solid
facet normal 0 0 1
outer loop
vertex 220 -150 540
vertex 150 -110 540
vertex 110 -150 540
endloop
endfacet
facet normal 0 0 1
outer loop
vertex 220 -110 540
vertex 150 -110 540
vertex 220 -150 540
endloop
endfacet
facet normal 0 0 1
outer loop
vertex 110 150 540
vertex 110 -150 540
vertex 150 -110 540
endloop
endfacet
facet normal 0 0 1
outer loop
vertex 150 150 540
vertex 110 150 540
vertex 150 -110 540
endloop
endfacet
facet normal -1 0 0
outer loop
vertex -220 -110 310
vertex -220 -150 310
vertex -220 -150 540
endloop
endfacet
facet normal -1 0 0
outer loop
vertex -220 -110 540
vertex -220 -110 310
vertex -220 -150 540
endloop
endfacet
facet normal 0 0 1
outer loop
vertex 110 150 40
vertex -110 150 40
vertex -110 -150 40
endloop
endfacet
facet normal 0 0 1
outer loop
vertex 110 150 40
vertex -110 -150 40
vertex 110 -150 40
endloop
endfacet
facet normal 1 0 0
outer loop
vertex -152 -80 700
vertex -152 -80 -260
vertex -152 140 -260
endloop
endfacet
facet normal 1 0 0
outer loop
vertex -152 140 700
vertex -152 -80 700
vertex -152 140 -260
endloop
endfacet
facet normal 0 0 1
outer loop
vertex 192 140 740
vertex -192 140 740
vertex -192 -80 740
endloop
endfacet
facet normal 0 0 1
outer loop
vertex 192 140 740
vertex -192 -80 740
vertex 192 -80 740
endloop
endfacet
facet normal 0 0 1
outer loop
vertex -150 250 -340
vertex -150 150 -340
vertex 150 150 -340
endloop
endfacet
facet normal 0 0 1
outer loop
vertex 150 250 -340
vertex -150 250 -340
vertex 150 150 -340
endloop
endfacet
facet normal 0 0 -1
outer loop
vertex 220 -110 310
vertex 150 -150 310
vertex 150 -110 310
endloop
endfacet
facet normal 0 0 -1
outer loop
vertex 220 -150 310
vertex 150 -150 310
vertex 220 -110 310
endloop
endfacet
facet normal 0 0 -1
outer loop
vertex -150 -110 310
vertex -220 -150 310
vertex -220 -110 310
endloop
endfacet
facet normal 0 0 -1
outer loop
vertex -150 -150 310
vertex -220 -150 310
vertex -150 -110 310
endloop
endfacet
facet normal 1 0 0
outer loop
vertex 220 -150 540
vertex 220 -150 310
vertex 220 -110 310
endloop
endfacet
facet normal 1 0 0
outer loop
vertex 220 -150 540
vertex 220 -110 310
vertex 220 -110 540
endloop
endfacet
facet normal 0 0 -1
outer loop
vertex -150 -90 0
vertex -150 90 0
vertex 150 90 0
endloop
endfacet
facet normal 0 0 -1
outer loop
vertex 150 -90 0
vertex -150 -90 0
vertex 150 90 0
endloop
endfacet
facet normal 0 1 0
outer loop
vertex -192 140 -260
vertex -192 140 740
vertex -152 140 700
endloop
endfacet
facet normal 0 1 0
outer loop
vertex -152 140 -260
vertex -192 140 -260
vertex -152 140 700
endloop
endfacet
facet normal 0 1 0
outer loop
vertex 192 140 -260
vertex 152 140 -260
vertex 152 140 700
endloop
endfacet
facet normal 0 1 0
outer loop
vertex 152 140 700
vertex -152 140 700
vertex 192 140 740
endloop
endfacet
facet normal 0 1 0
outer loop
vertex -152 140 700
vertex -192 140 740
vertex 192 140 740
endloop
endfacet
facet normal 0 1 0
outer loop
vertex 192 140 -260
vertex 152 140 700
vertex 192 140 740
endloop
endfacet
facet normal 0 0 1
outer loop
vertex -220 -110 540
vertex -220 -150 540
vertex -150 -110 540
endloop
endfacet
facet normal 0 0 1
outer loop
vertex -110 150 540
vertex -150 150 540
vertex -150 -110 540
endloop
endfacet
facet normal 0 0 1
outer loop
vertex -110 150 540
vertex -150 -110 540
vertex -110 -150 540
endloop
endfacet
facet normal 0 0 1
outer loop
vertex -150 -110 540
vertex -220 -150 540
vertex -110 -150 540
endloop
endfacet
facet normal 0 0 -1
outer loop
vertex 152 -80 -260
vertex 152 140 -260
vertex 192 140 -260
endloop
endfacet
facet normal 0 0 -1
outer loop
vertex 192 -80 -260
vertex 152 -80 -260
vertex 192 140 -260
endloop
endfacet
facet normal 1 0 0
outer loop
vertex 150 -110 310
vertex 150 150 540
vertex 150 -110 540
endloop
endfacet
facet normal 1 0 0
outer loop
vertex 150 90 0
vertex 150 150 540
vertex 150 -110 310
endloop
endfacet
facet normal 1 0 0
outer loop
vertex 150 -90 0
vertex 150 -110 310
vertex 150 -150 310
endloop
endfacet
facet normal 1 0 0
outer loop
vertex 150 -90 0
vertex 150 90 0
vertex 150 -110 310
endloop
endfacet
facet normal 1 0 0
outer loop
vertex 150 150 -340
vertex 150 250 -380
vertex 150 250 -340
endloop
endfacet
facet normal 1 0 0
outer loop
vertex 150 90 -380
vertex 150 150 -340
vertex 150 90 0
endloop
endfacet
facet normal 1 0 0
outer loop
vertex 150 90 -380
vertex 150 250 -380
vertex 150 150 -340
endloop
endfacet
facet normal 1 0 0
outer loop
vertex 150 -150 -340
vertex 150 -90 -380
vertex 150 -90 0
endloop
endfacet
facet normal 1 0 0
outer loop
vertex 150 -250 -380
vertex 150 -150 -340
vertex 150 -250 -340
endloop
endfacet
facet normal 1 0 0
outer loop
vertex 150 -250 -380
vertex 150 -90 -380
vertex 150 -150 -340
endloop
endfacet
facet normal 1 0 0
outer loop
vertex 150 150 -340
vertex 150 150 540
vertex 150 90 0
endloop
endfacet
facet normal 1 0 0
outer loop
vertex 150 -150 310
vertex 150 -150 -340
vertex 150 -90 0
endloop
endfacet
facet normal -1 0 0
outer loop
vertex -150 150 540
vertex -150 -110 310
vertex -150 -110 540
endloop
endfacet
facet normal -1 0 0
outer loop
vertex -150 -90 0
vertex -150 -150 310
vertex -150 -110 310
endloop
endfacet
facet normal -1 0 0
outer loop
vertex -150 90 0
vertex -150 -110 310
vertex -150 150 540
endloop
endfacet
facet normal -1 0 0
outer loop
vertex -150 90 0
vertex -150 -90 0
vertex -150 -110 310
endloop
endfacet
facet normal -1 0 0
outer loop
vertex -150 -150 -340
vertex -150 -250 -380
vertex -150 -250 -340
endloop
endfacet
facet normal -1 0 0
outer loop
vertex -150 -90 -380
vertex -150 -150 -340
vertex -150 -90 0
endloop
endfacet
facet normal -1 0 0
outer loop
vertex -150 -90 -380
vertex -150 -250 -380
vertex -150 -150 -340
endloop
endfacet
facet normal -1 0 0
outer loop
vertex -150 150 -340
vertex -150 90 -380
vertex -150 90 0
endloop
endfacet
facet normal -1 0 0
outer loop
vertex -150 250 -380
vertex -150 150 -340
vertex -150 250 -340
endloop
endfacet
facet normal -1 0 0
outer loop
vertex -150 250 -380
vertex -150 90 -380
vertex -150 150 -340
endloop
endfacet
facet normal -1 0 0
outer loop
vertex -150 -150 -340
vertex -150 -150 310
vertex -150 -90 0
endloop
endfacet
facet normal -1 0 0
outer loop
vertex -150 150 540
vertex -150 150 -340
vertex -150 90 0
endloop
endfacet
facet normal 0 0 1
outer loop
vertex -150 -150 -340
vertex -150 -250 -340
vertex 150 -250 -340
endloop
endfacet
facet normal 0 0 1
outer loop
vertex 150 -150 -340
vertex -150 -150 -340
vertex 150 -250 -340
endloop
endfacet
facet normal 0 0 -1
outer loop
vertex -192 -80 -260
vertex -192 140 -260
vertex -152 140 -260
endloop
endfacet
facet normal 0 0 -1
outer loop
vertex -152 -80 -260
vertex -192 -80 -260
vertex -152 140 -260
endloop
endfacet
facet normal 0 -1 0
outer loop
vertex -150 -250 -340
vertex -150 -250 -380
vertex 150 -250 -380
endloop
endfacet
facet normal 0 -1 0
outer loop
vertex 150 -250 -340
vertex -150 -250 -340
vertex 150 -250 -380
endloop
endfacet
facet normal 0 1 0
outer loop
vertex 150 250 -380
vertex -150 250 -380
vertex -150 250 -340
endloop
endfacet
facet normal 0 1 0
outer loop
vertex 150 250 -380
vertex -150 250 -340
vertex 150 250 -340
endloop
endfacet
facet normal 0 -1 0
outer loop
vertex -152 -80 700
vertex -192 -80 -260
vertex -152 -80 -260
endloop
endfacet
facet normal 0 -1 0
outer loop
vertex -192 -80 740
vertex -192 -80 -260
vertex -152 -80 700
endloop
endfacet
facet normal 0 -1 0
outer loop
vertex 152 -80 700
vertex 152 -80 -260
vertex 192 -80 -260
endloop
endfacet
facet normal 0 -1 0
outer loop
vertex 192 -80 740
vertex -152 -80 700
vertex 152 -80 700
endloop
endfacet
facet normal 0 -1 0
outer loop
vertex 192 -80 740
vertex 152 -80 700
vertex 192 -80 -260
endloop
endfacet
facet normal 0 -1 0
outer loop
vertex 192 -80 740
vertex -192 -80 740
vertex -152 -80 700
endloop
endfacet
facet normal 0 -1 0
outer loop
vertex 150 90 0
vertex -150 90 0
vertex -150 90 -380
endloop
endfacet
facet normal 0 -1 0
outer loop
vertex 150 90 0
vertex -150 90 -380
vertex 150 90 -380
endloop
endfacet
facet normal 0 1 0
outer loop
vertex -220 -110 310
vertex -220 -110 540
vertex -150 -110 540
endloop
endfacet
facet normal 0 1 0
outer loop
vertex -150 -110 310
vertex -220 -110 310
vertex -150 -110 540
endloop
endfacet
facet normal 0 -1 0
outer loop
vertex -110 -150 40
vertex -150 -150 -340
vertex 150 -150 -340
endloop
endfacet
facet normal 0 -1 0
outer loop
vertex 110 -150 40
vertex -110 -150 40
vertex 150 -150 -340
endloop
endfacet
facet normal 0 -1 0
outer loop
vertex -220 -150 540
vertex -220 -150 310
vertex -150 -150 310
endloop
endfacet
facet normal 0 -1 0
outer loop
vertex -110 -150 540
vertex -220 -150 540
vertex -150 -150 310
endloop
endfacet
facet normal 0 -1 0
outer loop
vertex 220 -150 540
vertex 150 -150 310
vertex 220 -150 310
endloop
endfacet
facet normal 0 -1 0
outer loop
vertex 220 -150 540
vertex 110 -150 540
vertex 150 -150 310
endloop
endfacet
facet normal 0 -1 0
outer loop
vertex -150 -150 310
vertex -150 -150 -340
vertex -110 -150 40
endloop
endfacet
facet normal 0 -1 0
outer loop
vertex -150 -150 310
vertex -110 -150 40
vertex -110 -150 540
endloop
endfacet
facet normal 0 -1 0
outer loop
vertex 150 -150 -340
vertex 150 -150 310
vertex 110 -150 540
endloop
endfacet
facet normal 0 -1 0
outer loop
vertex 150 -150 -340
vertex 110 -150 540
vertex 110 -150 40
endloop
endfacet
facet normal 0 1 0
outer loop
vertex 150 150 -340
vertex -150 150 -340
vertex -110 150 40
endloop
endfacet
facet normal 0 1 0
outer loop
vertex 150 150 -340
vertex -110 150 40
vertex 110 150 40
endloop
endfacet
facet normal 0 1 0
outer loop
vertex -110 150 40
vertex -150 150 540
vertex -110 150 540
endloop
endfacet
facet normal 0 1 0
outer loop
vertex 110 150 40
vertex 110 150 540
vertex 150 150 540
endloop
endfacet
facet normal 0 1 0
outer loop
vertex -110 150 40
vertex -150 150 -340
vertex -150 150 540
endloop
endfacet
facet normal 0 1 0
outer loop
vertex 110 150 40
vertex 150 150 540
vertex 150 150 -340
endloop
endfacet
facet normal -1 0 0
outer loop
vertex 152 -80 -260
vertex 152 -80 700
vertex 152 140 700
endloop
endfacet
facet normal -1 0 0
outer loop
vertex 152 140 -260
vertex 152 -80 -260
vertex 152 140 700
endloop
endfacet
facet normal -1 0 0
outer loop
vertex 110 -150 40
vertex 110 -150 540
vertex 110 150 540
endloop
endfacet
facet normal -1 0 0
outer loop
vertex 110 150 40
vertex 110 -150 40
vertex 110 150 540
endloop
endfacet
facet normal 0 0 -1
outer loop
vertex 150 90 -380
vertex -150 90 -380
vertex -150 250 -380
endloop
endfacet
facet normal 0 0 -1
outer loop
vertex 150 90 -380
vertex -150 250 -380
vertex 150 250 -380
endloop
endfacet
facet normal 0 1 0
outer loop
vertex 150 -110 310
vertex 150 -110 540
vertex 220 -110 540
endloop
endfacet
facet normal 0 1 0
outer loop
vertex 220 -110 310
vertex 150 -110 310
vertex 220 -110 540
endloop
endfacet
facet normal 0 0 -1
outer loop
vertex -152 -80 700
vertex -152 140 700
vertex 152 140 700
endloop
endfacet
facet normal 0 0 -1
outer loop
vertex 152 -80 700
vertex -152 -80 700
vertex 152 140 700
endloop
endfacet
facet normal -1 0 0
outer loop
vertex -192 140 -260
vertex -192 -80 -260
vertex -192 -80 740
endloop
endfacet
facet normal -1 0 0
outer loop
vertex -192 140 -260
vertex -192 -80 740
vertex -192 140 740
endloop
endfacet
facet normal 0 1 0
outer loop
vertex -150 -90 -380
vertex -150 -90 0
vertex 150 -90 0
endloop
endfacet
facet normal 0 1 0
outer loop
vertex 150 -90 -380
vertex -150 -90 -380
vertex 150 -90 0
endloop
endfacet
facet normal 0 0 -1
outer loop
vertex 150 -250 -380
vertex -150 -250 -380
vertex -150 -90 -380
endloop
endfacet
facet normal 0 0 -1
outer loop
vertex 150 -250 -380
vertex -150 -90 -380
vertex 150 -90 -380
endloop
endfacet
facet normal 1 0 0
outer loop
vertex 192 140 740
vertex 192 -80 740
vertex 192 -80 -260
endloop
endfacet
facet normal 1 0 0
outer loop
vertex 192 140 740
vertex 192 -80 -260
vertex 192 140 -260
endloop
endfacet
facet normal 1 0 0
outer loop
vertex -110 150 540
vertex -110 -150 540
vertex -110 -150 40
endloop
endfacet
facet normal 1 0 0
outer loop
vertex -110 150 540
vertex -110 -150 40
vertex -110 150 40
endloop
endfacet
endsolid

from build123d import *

# Parameters (mm, degrees)
F0_W      = 300
F0_H      = 300
F1_DEPTH  = 40
F2_W      = 40
F2_H      = 300
F3_DEPTH  = 500
F4_W      = 70
F4_H      = 230
F5_DEPTH  = 40
F6_W      = 40
F6_H      = 220
F7_DEPTH  = 200
F8_W      = 344
F8_H      = 220
F9_DEPTH  = 40
F10_DEPTH = 800
F11_W     = 300
F11_H     = 60
F12_DEPTH = 380
F13_W     = 300
F13_H     = 100
F13_H_2   = 60
F13_H_3   = 160
F14_DEPTH = 40


with BuildPart() as f1:
    # F0 (on Top) → F1 (new body)
    with BuildSketch(Plane.XY):
        Rectangle(F0_W, F0_H)
    extrude(amount=F1_DEPTH)

    # F2 (on face) → F3 (join)
    with BuildSketch(Plane.XY.offset(40)):
        with Locations((-130, 0)):
            Rectangle(F2_W, F2_H)
        with Locations((130, 0)):
            Rectangle(F2_W, F2_H)
    extrude(amount=F3_DEPTH)

    # F4 (on face) → F5 (join)
    with BuildSketch(Plane.XZ.offset(150)):
        with Locations((-185, 425)):
            Rectangle(F4_W, F4_H)
        with Locations((185, 425)):
            Rectangle(F4_W, F4_H)
    extrude(amount=-F5_DEPTH)

    # F11 (on face) → F12 (join)
    with BuildSketch(Plane(origin=(0, 0, 0), x_dir=(1, 0, 0), z_dir=(0, 0, -1))):
        with Locations((0, -120)):
            Rectangle(F11_W, F11_H)
        with Locations((0, 120)):
            Rectangle(F11_W, F11_H)
    extrude(amount=F12_DEPTH)

    # F13 (on face) → F14 (join)
    with BuildSketch(Plane(origin=(0, 0, -380), x_dir=(1, 0, 0), z_dir=(0, 0, -1))):
        with Locations((0, 200)):
            Rectangle(F13_W, F13_H)
        with Locations((0, 120)):
            Rectangle(F13_W, F13_H_2)
        with Locations((0, -170)):
            Rectangle(F13_W, F13_H_3)
    extrude(amount=-F14_DEPTH)


with BuildPart() as f7:
    # F6 (on face) → F7 (new body)
    with BuildSketch(Plane.XY.offset(540)):
        with Locations((172, 30)):
            Rectangle(F6_W, F6_H)
    extrude(amount=F7_DEPTH)



with BuildPart() as f7b:
    # F6 (on face) → F7, piece 2 (new body)
    with BuildSketch(Plane.XY.offset(540)):
        with Locations((-172, 30)):
            Rectangle(F6_W, F6_H)
    extrude(amount=F7_DEPTH)


with BuildPart() as f7_1:
    add(f7.part)

    add(f7b.part)  # F9 merges F7b
    # F8 (on face) → F9 (join)
    with BuildSketch(Plane.XY.offset(740)):
        with Locations((-20, 30)):
            Rectangle(F8_W, F8_H)
    extrude(amount=-F9_DEPTH)

    # F10 (add): faces of the model
    f10_faces = [f7_1.faces().sort_by_distance(p)[0] for p in [
        (172, 30, 540),
        (-172, 30, 540),
    ]]
    extrude(f10_faces, amount=F10_DEPTH)


solid = Compound([f1.part, f7_1.part])
